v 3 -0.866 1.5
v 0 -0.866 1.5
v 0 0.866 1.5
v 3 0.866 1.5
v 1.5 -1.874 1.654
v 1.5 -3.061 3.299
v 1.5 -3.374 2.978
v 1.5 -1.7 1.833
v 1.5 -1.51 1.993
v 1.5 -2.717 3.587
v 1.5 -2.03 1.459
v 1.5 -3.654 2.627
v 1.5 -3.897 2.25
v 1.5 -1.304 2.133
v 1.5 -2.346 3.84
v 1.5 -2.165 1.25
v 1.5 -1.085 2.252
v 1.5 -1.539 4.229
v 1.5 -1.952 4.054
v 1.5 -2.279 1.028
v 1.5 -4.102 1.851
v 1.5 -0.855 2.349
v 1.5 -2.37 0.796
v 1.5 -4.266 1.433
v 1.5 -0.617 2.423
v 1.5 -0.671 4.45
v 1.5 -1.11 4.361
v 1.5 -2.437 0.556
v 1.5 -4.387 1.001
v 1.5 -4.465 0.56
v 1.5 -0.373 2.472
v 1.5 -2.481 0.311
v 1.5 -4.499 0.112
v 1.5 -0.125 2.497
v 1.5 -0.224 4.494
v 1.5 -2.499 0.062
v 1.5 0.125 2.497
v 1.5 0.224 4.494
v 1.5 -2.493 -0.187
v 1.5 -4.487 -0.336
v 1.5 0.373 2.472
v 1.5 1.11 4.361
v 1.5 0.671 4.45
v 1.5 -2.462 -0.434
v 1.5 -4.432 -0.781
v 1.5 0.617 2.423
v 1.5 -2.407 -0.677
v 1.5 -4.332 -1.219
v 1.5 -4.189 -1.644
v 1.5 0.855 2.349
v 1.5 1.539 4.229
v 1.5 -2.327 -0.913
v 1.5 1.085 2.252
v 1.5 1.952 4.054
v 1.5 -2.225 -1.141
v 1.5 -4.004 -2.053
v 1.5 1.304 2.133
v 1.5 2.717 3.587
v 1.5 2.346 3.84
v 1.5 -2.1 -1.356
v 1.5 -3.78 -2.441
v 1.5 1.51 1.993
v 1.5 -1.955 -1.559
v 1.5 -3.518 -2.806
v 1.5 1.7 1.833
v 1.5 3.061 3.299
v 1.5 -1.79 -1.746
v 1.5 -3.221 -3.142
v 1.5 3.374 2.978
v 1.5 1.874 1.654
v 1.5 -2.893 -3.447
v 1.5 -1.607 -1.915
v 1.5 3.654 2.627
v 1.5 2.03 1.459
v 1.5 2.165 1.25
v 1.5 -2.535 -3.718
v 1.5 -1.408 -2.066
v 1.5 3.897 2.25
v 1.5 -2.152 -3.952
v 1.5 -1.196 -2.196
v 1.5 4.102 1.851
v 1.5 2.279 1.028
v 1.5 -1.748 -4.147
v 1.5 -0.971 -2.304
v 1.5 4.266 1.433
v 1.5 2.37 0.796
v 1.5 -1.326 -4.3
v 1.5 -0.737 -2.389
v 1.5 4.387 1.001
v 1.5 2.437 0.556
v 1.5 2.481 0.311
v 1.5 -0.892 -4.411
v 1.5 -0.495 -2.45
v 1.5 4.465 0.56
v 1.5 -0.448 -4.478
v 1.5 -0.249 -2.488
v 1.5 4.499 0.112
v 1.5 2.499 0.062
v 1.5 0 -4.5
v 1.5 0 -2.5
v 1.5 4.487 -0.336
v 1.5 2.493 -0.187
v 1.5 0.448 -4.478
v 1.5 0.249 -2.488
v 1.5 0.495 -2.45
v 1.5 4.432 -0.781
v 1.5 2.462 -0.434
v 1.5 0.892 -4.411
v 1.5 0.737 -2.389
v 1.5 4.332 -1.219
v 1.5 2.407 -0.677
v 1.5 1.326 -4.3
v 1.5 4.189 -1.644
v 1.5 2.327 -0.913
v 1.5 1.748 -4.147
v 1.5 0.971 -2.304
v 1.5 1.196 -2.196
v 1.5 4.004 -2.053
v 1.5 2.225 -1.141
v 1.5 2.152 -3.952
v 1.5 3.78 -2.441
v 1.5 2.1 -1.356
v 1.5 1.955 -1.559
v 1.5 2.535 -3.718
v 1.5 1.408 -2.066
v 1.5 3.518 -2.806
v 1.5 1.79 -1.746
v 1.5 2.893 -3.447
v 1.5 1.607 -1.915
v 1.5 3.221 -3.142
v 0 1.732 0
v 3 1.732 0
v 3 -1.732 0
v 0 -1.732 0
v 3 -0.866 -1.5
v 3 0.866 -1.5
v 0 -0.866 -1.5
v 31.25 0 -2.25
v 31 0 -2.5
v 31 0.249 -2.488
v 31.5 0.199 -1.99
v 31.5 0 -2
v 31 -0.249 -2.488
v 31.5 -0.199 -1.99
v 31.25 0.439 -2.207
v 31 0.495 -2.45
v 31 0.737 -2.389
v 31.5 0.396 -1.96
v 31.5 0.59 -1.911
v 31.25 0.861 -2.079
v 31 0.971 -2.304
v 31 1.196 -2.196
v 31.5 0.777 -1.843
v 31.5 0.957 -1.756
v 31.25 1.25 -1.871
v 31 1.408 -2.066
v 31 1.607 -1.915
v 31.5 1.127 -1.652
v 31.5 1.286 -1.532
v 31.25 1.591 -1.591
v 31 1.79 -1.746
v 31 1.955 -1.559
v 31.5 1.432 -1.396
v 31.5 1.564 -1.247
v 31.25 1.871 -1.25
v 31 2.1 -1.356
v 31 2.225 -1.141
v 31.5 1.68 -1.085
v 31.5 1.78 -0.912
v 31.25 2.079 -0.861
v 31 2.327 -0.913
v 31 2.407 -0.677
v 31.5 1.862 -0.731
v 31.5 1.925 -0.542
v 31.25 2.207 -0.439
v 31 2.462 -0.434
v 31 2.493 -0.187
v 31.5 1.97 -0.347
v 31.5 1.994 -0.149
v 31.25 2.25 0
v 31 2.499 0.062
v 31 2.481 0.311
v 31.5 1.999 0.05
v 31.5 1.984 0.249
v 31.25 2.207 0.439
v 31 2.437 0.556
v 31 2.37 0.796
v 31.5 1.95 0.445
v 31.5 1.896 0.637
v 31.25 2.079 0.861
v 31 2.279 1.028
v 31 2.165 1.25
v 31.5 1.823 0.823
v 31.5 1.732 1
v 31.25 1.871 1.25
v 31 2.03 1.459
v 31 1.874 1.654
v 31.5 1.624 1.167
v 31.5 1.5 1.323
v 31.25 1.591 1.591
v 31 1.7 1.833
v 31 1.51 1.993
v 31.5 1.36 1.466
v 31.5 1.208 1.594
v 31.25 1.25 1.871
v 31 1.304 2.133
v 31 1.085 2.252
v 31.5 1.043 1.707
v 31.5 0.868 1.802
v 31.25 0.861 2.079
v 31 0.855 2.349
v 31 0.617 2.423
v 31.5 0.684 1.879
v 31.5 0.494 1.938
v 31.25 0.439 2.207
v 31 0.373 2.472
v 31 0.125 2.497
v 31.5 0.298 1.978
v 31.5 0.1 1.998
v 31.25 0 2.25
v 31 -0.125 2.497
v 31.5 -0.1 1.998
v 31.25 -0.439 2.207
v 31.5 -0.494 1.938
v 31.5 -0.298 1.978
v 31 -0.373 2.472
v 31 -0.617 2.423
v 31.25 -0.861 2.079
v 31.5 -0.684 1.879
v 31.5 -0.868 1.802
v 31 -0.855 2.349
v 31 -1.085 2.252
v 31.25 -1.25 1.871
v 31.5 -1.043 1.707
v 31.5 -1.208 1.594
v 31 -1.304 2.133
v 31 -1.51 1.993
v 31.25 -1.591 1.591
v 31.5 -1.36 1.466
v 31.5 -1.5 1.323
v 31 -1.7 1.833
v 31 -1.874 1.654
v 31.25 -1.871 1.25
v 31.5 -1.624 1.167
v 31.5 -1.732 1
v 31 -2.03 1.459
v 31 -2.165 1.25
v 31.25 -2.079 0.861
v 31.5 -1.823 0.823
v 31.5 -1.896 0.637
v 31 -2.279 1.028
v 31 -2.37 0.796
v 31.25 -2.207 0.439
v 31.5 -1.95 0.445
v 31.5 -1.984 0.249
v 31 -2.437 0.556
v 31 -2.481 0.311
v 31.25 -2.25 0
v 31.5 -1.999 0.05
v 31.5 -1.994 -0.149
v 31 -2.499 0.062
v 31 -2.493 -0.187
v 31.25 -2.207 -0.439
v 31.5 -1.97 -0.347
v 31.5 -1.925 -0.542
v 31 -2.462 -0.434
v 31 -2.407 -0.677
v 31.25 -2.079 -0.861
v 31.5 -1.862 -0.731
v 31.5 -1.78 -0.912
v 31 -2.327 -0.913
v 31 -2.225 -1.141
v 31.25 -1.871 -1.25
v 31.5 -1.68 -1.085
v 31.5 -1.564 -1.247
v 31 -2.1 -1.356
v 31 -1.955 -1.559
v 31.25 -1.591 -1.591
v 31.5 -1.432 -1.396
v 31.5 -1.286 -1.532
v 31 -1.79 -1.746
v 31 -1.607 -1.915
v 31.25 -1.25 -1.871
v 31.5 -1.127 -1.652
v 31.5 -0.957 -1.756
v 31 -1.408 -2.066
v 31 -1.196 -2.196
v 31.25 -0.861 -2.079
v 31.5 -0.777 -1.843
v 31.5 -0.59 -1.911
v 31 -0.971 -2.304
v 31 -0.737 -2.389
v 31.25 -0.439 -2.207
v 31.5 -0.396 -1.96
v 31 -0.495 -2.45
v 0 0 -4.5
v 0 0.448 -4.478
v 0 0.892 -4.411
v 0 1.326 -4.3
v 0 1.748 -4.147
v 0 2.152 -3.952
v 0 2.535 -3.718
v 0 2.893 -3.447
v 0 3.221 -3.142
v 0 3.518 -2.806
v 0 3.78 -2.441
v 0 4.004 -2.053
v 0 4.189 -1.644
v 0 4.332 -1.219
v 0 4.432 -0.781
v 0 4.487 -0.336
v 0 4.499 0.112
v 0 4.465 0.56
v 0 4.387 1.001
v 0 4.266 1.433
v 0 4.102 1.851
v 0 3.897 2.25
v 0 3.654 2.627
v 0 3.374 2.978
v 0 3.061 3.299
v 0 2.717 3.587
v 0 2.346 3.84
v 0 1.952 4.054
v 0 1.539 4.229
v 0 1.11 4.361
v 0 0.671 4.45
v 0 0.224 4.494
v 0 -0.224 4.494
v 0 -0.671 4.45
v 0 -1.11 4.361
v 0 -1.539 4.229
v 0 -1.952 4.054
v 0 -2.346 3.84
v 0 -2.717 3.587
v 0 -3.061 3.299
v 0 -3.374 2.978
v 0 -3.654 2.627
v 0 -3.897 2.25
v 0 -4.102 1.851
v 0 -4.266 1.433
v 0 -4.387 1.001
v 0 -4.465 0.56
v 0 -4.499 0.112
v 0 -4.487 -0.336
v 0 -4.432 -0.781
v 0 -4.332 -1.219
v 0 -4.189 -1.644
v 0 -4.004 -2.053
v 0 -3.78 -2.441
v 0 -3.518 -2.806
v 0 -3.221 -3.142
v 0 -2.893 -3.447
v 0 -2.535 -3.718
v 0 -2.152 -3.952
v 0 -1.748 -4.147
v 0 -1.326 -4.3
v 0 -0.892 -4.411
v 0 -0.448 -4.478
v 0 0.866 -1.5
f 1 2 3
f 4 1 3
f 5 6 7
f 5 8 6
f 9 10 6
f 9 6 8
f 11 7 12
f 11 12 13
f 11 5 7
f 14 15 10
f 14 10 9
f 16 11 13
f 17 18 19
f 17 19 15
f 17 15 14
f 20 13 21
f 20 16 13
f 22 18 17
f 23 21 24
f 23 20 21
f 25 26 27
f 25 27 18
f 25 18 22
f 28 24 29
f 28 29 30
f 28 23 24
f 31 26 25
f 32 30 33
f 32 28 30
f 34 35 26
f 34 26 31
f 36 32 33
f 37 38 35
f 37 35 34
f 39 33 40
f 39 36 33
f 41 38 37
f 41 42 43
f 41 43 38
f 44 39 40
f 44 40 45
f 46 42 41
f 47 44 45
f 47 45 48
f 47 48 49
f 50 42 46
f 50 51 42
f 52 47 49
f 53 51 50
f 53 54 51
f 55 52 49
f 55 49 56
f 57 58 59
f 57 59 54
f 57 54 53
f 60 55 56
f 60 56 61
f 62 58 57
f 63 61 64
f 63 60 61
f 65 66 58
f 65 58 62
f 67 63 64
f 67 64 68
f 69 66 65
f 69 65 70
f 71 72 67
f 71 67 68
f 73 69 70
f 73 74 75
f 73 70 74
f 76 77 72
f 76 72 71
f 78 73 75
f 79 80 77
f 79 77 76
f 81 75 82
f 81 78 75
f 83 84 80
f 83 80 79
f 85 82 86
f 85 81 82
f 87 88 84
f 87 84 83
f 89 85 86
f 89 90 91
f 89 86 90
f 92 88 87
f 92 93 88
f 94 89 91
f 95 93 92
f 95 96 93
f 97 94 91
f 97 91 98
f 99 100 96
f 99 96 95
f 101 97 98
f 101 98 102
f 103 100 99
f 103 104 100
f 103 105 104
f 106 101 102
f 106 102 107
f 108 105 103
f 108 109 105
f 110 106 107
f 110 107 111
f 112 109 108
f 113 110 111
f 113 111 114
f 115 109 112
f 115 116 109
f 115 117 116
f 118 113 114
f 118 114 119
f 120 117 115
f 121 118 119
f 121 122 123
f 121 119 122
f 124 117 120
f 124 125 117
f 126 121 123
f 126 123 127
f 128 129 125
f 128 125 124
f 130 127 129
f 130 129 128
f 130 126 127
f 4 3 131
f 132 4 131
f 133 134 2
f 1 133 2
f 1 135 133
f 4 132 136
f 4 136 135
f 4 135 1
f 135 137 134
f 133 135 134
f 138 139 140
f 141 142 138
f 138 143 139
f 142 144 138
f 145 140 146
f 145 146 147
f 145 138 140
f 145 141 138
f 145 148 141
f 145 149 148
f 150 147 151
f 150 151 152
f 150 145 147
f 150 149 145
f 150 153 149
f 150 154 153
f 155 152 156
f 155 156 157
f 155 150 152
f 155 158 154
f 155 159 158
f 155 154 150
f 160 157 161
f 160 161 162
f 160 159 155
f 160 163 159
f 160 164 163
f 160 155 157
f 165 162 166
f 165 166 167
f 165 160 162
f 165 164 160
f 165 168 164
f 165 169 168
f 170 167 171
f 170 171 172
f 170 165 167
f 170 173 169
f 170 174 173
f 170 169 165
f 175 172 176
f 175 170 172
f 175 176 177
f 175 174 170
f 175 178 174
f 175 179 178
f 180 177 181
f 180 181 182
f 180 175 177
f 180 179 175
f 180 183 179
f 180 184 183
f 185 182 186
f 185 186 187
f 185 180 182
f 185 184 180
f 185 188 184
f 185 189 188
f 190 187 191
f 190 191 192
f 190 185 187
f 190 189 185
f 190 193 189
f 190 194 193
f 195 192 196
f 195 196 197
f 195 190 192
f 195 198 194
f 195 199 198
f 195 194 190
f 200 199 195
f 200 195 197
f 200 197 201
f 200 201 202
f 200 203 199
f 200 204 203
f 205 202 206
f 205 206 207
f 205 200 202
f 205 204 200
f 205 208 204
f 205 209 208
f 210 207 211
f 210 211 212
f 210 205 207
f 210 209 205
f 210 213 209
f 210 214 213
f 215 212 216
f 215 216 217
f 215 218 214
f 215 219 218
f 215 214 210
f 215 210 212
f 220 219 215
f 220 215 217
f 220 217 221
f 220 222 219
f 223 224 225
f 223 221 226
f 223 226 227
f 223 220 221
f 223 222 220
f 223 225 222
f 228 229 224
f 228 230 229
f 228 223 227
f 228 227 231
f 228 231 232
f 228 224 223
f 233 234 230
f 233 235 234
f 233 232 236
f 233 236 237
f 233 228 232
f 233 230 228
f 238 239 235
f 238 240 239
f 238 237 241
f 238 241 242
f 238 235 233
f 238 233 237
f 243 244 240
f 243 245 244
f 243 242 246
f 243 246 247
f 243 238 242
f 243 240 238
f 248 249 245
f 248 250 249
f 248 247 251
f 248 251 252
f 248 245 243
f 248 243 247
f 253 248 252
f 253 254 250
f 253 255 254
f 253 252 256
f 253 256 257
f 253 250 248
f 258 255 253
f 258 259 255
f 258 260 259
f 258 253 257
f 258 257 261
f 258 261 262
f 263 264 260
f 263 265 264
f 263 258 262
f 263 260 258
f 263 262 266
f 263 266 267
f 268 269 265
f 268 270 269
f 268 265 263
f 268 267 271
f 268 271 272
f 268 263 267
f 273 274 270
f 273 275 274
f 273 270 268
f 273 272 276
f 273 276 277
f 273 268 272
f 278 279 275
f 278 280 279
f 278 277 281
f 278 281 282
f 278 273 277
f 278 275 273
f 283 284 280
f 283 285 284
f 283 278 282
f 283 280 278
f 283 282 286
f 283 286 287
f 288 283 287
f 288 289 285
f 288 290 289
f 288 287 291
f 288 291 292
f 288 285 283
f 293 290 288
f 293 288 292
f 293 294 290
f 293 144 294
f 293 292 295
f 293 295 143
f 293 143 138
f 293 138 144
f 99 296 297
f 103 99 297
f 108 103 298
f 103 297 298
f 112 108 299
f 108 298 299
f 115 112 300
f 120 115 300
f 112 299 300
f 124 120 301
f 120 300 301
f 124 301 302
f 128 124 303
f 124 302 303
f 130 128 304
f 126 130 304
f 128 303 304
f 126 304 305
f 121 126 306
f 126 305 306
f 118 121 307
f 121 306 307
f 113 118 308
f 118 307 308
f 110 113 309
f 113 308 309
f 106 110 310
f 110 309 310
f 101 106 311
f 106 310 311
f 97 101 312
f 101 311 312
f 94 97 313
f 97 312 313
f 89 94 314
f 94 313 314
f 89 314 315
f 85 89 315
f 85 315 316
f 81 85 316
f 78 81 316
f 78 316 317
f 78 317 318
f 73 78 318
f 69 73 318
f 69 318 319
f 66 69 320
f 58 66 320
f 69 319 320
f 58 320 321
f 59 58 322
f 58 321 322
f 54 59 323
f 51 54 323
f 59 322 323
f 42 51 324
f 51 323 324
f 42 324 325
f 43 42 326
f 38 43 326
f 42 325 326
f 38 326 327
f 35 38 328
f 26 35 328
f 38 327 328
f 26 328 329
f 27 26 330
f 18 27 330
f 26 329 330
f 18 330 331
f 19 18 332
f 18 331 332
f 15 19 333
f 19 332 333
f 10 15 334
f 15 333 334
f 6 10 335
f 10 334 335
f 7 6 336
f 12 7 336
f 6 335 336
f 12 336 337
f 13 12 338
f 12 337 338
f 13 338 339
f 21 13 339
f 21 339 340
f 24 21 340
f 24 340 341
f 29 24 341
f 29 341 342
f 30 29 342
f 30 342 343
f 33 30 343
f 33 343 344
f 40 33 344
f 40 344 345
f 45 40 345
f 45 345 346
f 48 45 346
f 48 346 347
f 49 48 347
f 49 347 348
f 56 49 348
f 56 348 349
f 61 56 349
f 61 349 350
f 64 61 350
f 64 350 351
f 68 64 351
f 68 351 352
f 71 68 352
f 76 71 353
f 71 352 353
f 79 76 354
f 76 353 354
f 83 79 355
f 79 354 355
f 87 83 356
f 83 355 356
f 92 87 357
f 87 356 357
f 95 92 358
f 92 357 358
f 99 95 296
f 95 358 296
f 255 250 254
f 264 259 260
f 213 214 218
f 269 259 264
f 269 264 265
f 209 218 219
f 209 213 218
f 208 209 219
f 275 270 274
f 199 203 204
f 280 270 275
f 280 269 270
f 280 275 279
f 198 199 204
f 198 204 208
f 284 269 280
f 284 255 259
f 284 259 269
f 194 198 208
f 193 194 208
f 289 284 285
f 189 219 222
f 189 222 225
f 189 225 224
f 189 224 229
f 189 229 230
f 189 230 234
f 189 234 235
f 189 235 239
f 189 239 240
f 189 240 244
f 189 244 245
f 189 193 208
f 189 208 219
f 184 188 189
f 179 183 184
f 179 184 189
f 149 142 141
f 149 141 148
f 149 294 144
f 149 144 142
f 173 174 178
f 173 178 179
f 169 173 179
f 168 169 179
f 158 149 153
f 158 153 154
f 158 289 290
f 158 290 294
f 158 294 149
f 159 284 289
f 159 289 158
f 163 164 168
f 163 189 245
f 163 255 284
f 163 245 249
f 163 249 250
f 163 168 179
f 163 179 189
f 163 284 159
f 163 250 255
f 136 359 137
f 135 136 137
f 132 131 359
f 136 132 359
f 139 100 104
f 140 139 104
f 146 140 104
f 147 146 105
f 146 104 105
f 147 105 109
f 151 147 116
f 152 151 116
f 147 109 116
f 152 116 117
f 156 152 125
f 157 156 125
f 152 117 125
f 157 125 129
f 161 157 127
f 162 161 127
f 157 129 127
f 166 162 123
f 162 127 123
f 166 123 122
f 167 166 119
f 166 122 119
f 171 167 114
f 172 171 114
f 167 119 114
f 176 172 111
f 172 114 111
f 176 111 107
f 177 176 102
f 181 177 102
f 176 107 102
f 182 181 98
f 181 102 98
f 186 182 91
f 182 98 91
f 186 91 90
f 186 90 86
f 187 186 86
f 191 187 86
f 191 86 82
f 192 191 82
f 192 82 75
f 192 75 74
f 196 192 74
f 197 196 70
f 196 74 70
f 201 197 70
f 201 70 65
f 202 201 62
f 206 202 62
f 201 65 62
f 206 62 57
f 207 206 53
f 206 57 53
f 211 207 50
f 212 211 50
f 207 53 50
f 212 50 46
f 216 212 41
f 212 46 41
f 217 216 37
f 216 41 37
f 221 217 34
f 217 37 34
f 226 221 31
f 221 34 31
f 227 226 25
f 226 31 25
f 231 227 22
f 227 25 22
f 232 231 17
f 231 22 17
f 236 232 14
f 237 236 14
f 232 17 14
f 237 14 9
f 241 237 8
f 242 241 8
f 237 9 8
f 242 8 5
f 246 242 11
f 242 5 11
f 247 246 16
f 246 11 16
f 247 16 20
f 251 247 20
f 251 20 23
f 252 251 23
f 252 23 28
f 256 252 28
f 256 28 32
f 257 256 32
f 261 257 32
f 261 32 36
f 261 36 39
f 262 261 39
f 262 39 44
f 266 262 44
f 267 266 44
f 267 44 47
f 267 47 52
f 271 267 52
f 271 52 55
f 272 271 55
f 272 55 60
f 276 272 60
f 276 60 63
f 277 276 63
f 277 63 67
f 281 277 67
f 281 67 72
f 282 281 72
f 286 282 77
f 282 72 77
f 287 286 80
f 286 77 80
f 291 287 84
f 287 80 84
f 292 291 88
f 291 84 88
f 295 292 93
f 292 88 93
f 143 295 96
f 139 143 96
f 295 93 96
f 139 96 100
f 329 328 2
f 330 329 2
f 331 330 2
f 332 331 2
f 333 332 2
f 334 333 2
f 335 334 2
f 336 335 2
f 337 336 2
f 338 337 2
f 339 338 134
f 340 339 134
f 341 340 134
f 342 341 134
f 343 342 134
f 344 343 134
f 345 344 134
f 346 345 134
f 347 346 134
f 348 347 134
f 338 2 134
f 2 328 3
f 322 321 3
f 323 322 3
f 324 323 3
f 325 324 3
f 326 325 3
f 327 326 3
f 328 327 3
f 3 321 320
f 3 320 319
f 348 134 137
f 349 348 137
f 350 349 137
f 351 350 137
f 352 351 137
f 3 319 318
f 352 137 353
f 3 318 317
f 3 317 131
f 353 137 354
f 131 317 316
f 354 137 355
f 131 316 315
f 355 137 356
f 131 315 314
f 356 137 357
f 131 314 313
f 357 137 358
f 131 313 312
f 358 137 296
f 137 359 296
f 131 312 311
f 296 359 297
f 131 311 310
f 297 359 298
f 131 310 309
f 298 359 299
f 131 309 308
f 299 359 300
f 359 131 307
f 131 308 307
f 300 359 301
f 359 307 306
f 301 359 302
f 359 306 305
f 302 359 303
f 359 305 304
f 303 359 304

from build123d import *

# Parameters (mm, degrees)
SKETCH1_R     = 4.5
HEAD_DEPTH    = 1.5
SKETCH2_R     = 2.5
BODY_DEPTH    = 30
DRIVE_DEPTH   = 3
CHAMFER1_SIZE = 0.5


with BuildPart() as part:
    # Sketch1 → Head (new body)
    with BuildSketch(Plane(origin=(0, 0, 0), x_dir=(0, 0, -1), z_dir=(1, 0, 0))):
        Circle(SKETCH1_R)
    extrude(amount=HEAD_DEPTH)

    # Sketch2 → Body (add)
    with BuildSketch(Plane(origin=(1.5, 0, 0), x_dir=(0, 0, -1), z_dir=(1, 0, 0))):
        Circle(SKETCH2_R)
    extrude(amount=BODY_DEPTH)

    # Sketch3 → Drive (cut)
    with BuildSketch(Plane.ZY):
        Polygon((0, 1.732050808), (-1.5, 0.866025404), (-1.5, -0.866025404), (0, -1.732050808), (1.5, -0.866025404), (1.5, 0.866025404), align=None)
    extrude(amount=-DRIVE_DEPTH, mode=Mode.SUBTRACT)

    # Chamfer1
    chamfer1_edges = [part.edges().sort_by_distance(p)[0] for p in [
        (31.5, 0, 2.5),
    ]]
    chamfer(chamfer1_edges, length=CHAMFER1_SIZE)


solid = part.part
